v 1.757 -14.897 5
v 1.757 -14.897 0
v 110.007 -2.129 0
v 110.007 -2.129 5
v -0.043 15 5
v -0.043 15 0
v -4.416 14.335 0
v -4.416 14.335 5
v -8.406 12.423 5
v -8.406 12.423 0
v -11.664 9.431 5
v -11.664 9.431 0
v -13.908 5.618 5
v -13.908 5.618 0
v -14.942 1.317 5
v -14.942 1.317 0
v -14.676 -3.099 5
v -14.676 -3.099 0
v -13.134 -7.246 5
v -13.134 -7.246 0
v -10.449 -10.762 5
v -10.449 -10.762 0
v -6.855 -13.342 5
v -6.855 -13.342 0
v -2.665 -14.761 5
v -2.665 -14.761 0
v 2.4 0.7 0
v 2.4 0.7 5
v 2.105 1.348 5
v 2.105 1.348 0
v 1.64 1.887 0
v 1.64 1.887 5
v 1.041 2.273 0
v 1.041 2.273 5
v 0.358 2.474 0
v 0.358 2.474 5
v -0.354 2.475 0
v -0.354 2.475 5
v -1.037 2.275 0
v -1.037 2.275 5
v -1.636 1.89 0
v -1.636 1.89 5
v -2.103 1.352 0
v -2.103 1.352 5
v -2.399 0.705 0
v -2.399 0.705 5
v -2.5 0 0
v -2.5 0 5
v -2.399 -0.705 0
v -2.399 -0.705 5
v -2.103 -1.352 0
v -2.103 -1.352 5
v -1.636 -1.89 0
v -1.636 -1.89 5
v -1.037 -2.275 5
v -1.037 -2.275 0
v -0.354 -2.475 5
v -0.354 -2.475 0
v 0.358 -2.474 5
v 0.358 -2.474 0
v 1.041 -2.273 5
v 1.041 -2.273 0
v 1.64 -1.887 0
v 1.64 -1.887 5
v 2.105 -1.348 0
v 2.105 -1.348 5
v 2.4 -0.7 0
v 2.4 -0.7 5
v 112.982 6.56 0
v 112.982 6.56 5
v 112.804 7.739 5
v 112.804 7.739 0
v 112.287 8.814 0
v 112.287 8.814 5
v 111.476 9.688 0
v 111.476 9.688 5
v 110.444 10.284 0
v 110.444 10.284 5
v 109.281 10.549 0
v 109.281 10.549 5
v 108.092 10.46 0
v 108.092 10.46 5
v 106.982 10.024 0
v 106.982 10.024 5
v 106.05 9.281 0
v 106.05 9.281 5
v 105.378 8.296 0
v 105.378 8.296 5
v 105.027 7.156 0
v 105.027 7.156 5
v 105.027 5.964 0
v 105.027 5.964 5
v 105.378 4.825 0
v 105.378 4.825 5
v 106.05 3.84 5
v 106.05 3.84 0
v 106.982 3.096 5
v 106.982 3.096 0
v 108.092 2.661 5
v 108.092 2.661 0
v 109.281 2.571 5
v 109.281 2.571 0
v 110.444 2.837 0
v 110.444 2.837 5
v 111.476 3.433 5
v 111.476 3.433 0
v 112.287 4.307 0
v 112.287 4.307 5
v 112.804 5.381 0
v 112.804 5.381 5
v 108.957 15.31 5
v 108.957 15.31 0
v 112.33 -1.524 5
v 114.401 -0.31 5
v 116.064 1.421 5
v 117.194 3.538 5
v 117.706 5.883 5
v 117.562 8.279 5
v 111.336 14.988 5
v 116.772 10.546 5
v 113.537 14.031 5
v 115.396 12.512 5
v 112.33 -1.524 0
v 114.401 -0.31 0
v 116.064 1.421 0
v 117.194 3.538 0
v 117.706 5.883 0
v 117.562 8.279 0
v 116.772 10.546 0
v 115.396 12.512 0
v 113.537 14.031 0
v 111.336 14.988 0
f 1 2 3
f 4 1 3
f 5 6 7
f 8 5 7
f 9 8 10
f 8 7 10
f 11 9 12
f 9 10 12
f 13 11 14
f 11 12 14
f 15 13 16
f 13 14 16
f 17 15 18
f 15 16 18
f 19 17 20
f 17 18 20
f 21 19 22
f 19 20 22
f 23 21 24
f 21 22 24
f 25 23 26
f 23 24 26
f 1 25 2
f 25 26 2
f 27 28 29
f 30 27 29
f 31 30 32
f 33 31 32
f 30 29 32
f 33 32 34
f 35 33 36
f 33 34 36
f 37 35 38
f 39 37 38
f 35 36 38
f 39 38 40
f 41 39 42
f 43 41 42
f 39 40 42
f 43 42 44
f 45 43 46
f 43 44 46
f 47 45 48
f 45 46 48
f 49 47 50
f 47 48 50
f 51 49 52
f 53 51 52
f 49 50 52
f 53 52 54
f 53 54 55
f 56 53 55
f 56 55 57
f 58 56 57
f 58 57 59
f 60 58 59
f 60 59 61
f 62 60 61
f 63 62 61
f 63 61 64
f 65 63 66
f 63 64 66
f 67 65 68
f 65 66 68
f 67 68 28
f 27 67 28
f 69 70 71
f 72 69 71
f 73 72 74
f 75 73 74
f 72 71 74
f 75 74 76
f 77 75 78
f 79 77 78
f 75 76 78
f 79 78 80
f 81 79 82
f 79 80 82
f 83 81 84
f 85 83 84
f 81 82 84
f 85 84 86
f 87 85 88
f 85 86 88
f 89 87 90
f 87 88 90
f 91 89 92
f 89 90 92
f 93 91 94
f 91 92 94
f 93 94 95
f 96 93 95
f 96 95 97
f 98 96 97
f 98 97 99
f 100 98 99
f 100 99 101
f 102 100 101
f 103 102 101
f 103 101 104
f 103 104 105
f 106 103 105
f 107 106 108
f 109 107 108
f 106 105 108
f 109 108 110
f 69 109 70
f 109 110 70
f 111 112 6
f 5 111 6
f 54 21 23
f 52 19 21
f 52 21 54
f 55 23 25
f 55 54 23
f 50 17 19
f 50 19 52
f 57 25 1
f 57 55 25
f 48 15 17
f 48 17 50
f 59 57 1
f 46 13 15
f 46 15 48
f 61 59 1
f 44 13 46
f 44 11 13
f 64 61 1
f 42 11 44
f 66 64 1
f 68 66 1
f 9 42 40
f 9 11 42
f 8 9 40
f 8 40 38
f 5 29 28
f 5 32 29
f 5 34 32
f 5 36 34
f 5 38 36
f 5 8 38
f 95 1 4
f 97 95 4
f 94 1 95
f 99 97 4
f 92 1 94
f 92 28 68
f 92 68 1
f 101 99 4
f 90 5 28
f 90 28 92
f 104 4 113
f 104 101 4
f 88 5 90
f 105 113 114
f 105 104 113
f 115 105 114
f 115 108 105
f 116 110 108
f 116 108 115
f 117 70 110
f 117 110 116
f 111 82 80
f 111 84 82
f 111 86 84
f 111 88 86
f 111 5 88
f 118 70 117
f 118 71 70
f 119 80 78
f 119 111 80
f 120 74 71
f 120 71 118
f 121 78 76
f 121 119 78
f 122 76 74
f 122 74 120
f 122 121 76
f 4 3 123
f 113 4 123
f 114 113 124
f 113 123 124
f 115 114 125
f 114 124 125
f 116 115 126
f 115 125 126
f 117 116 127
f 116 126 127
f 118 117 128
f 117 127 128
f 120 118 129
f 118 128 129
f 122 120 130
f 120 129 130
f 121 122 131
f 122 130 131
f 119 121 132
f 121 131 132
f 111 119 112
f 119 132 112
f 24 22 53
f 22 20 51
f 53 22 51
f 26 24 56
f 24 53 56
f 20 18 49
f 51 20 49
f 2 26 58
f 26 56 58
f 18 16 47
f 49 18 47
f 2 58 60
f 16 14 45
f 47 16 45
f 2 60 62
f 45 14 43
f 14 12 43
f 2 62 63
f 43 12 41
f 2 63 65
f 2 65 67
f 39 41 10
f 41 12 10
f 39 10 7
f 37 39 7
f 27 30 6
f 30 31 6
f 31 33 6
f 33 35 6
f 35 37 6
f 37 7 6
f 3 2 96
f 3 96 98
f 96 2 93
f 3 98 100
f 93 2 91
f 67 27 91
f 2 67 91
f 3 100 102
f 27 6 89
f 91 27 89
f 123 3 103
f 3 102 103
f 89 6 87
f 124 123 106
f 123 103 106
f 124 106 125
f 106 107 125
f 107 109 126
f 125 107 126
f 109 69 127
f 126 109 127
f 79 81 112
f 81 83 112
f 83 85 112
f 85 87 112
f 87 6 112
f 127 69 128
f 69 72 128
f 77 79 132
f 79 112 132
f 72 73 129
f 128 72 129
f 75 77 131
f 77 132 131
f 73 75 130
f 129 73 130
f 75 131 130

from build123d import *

# Parameters (mm, degrees)
SKETCH_2_R          = 15
SKETCH_2_R_2        = 8.75
EXTRUDE_1_DEPTH     = 5
SKETCH_3_R          = 4
CUT_EXTRUDE_1_DEPTH = 5


with BuildPart() as part:
    # 草图2 → 凸台-拉伸1 (new body)
    with BuildSketch(Plane.XY):
        Circle(SKETCH_2_R)
        with BuildLine():
            Line((108.957293046, 15.310277664), (-0.042706954, 14.999939204))
            ThreePointArc((-0.042706954, 14.999939204), (10.591491767, 10.621690174), (15, 0))
            ThreePointArc((15, 0), (11.210584144, -9.966082639), (1.756959578, -14.896747734))
            Line((1.756959578, -14.896747734), (110.007098523, -2.129456383))
            ThreePointArc((110.007098523, -2.129456383), (100.248015648, 6.034548214), (108.957293046, 15.310277664))
        make_face()
        with Locations((108.982205436, 6.560313128)):
            Circle(SKETCH_2_R_2)
    extrude(amount=EXTRUDE_1_DEPTH)

    # 草图3 → 切除-拉伸1 (cut)
    with BuildSketch(Plane.XY.offset(5)):
        with BuildLine():
            Line((2.4, -0.7), (2.4, 0))
            Line((2.4, 0), (2.4, 0.7))
            ThreePointArc((2.4, 0.7), (-2.5, 0), (2.4, -0.7))
        make_face()
        with Locations((108.982205436, 6.560313128)):
            Circle(SKETCH_3_R)
    extrude(amount=-CUT_EXTRUDE_1_DEPTH, mode=Mode.SUBTRACT)


solid = part.part
